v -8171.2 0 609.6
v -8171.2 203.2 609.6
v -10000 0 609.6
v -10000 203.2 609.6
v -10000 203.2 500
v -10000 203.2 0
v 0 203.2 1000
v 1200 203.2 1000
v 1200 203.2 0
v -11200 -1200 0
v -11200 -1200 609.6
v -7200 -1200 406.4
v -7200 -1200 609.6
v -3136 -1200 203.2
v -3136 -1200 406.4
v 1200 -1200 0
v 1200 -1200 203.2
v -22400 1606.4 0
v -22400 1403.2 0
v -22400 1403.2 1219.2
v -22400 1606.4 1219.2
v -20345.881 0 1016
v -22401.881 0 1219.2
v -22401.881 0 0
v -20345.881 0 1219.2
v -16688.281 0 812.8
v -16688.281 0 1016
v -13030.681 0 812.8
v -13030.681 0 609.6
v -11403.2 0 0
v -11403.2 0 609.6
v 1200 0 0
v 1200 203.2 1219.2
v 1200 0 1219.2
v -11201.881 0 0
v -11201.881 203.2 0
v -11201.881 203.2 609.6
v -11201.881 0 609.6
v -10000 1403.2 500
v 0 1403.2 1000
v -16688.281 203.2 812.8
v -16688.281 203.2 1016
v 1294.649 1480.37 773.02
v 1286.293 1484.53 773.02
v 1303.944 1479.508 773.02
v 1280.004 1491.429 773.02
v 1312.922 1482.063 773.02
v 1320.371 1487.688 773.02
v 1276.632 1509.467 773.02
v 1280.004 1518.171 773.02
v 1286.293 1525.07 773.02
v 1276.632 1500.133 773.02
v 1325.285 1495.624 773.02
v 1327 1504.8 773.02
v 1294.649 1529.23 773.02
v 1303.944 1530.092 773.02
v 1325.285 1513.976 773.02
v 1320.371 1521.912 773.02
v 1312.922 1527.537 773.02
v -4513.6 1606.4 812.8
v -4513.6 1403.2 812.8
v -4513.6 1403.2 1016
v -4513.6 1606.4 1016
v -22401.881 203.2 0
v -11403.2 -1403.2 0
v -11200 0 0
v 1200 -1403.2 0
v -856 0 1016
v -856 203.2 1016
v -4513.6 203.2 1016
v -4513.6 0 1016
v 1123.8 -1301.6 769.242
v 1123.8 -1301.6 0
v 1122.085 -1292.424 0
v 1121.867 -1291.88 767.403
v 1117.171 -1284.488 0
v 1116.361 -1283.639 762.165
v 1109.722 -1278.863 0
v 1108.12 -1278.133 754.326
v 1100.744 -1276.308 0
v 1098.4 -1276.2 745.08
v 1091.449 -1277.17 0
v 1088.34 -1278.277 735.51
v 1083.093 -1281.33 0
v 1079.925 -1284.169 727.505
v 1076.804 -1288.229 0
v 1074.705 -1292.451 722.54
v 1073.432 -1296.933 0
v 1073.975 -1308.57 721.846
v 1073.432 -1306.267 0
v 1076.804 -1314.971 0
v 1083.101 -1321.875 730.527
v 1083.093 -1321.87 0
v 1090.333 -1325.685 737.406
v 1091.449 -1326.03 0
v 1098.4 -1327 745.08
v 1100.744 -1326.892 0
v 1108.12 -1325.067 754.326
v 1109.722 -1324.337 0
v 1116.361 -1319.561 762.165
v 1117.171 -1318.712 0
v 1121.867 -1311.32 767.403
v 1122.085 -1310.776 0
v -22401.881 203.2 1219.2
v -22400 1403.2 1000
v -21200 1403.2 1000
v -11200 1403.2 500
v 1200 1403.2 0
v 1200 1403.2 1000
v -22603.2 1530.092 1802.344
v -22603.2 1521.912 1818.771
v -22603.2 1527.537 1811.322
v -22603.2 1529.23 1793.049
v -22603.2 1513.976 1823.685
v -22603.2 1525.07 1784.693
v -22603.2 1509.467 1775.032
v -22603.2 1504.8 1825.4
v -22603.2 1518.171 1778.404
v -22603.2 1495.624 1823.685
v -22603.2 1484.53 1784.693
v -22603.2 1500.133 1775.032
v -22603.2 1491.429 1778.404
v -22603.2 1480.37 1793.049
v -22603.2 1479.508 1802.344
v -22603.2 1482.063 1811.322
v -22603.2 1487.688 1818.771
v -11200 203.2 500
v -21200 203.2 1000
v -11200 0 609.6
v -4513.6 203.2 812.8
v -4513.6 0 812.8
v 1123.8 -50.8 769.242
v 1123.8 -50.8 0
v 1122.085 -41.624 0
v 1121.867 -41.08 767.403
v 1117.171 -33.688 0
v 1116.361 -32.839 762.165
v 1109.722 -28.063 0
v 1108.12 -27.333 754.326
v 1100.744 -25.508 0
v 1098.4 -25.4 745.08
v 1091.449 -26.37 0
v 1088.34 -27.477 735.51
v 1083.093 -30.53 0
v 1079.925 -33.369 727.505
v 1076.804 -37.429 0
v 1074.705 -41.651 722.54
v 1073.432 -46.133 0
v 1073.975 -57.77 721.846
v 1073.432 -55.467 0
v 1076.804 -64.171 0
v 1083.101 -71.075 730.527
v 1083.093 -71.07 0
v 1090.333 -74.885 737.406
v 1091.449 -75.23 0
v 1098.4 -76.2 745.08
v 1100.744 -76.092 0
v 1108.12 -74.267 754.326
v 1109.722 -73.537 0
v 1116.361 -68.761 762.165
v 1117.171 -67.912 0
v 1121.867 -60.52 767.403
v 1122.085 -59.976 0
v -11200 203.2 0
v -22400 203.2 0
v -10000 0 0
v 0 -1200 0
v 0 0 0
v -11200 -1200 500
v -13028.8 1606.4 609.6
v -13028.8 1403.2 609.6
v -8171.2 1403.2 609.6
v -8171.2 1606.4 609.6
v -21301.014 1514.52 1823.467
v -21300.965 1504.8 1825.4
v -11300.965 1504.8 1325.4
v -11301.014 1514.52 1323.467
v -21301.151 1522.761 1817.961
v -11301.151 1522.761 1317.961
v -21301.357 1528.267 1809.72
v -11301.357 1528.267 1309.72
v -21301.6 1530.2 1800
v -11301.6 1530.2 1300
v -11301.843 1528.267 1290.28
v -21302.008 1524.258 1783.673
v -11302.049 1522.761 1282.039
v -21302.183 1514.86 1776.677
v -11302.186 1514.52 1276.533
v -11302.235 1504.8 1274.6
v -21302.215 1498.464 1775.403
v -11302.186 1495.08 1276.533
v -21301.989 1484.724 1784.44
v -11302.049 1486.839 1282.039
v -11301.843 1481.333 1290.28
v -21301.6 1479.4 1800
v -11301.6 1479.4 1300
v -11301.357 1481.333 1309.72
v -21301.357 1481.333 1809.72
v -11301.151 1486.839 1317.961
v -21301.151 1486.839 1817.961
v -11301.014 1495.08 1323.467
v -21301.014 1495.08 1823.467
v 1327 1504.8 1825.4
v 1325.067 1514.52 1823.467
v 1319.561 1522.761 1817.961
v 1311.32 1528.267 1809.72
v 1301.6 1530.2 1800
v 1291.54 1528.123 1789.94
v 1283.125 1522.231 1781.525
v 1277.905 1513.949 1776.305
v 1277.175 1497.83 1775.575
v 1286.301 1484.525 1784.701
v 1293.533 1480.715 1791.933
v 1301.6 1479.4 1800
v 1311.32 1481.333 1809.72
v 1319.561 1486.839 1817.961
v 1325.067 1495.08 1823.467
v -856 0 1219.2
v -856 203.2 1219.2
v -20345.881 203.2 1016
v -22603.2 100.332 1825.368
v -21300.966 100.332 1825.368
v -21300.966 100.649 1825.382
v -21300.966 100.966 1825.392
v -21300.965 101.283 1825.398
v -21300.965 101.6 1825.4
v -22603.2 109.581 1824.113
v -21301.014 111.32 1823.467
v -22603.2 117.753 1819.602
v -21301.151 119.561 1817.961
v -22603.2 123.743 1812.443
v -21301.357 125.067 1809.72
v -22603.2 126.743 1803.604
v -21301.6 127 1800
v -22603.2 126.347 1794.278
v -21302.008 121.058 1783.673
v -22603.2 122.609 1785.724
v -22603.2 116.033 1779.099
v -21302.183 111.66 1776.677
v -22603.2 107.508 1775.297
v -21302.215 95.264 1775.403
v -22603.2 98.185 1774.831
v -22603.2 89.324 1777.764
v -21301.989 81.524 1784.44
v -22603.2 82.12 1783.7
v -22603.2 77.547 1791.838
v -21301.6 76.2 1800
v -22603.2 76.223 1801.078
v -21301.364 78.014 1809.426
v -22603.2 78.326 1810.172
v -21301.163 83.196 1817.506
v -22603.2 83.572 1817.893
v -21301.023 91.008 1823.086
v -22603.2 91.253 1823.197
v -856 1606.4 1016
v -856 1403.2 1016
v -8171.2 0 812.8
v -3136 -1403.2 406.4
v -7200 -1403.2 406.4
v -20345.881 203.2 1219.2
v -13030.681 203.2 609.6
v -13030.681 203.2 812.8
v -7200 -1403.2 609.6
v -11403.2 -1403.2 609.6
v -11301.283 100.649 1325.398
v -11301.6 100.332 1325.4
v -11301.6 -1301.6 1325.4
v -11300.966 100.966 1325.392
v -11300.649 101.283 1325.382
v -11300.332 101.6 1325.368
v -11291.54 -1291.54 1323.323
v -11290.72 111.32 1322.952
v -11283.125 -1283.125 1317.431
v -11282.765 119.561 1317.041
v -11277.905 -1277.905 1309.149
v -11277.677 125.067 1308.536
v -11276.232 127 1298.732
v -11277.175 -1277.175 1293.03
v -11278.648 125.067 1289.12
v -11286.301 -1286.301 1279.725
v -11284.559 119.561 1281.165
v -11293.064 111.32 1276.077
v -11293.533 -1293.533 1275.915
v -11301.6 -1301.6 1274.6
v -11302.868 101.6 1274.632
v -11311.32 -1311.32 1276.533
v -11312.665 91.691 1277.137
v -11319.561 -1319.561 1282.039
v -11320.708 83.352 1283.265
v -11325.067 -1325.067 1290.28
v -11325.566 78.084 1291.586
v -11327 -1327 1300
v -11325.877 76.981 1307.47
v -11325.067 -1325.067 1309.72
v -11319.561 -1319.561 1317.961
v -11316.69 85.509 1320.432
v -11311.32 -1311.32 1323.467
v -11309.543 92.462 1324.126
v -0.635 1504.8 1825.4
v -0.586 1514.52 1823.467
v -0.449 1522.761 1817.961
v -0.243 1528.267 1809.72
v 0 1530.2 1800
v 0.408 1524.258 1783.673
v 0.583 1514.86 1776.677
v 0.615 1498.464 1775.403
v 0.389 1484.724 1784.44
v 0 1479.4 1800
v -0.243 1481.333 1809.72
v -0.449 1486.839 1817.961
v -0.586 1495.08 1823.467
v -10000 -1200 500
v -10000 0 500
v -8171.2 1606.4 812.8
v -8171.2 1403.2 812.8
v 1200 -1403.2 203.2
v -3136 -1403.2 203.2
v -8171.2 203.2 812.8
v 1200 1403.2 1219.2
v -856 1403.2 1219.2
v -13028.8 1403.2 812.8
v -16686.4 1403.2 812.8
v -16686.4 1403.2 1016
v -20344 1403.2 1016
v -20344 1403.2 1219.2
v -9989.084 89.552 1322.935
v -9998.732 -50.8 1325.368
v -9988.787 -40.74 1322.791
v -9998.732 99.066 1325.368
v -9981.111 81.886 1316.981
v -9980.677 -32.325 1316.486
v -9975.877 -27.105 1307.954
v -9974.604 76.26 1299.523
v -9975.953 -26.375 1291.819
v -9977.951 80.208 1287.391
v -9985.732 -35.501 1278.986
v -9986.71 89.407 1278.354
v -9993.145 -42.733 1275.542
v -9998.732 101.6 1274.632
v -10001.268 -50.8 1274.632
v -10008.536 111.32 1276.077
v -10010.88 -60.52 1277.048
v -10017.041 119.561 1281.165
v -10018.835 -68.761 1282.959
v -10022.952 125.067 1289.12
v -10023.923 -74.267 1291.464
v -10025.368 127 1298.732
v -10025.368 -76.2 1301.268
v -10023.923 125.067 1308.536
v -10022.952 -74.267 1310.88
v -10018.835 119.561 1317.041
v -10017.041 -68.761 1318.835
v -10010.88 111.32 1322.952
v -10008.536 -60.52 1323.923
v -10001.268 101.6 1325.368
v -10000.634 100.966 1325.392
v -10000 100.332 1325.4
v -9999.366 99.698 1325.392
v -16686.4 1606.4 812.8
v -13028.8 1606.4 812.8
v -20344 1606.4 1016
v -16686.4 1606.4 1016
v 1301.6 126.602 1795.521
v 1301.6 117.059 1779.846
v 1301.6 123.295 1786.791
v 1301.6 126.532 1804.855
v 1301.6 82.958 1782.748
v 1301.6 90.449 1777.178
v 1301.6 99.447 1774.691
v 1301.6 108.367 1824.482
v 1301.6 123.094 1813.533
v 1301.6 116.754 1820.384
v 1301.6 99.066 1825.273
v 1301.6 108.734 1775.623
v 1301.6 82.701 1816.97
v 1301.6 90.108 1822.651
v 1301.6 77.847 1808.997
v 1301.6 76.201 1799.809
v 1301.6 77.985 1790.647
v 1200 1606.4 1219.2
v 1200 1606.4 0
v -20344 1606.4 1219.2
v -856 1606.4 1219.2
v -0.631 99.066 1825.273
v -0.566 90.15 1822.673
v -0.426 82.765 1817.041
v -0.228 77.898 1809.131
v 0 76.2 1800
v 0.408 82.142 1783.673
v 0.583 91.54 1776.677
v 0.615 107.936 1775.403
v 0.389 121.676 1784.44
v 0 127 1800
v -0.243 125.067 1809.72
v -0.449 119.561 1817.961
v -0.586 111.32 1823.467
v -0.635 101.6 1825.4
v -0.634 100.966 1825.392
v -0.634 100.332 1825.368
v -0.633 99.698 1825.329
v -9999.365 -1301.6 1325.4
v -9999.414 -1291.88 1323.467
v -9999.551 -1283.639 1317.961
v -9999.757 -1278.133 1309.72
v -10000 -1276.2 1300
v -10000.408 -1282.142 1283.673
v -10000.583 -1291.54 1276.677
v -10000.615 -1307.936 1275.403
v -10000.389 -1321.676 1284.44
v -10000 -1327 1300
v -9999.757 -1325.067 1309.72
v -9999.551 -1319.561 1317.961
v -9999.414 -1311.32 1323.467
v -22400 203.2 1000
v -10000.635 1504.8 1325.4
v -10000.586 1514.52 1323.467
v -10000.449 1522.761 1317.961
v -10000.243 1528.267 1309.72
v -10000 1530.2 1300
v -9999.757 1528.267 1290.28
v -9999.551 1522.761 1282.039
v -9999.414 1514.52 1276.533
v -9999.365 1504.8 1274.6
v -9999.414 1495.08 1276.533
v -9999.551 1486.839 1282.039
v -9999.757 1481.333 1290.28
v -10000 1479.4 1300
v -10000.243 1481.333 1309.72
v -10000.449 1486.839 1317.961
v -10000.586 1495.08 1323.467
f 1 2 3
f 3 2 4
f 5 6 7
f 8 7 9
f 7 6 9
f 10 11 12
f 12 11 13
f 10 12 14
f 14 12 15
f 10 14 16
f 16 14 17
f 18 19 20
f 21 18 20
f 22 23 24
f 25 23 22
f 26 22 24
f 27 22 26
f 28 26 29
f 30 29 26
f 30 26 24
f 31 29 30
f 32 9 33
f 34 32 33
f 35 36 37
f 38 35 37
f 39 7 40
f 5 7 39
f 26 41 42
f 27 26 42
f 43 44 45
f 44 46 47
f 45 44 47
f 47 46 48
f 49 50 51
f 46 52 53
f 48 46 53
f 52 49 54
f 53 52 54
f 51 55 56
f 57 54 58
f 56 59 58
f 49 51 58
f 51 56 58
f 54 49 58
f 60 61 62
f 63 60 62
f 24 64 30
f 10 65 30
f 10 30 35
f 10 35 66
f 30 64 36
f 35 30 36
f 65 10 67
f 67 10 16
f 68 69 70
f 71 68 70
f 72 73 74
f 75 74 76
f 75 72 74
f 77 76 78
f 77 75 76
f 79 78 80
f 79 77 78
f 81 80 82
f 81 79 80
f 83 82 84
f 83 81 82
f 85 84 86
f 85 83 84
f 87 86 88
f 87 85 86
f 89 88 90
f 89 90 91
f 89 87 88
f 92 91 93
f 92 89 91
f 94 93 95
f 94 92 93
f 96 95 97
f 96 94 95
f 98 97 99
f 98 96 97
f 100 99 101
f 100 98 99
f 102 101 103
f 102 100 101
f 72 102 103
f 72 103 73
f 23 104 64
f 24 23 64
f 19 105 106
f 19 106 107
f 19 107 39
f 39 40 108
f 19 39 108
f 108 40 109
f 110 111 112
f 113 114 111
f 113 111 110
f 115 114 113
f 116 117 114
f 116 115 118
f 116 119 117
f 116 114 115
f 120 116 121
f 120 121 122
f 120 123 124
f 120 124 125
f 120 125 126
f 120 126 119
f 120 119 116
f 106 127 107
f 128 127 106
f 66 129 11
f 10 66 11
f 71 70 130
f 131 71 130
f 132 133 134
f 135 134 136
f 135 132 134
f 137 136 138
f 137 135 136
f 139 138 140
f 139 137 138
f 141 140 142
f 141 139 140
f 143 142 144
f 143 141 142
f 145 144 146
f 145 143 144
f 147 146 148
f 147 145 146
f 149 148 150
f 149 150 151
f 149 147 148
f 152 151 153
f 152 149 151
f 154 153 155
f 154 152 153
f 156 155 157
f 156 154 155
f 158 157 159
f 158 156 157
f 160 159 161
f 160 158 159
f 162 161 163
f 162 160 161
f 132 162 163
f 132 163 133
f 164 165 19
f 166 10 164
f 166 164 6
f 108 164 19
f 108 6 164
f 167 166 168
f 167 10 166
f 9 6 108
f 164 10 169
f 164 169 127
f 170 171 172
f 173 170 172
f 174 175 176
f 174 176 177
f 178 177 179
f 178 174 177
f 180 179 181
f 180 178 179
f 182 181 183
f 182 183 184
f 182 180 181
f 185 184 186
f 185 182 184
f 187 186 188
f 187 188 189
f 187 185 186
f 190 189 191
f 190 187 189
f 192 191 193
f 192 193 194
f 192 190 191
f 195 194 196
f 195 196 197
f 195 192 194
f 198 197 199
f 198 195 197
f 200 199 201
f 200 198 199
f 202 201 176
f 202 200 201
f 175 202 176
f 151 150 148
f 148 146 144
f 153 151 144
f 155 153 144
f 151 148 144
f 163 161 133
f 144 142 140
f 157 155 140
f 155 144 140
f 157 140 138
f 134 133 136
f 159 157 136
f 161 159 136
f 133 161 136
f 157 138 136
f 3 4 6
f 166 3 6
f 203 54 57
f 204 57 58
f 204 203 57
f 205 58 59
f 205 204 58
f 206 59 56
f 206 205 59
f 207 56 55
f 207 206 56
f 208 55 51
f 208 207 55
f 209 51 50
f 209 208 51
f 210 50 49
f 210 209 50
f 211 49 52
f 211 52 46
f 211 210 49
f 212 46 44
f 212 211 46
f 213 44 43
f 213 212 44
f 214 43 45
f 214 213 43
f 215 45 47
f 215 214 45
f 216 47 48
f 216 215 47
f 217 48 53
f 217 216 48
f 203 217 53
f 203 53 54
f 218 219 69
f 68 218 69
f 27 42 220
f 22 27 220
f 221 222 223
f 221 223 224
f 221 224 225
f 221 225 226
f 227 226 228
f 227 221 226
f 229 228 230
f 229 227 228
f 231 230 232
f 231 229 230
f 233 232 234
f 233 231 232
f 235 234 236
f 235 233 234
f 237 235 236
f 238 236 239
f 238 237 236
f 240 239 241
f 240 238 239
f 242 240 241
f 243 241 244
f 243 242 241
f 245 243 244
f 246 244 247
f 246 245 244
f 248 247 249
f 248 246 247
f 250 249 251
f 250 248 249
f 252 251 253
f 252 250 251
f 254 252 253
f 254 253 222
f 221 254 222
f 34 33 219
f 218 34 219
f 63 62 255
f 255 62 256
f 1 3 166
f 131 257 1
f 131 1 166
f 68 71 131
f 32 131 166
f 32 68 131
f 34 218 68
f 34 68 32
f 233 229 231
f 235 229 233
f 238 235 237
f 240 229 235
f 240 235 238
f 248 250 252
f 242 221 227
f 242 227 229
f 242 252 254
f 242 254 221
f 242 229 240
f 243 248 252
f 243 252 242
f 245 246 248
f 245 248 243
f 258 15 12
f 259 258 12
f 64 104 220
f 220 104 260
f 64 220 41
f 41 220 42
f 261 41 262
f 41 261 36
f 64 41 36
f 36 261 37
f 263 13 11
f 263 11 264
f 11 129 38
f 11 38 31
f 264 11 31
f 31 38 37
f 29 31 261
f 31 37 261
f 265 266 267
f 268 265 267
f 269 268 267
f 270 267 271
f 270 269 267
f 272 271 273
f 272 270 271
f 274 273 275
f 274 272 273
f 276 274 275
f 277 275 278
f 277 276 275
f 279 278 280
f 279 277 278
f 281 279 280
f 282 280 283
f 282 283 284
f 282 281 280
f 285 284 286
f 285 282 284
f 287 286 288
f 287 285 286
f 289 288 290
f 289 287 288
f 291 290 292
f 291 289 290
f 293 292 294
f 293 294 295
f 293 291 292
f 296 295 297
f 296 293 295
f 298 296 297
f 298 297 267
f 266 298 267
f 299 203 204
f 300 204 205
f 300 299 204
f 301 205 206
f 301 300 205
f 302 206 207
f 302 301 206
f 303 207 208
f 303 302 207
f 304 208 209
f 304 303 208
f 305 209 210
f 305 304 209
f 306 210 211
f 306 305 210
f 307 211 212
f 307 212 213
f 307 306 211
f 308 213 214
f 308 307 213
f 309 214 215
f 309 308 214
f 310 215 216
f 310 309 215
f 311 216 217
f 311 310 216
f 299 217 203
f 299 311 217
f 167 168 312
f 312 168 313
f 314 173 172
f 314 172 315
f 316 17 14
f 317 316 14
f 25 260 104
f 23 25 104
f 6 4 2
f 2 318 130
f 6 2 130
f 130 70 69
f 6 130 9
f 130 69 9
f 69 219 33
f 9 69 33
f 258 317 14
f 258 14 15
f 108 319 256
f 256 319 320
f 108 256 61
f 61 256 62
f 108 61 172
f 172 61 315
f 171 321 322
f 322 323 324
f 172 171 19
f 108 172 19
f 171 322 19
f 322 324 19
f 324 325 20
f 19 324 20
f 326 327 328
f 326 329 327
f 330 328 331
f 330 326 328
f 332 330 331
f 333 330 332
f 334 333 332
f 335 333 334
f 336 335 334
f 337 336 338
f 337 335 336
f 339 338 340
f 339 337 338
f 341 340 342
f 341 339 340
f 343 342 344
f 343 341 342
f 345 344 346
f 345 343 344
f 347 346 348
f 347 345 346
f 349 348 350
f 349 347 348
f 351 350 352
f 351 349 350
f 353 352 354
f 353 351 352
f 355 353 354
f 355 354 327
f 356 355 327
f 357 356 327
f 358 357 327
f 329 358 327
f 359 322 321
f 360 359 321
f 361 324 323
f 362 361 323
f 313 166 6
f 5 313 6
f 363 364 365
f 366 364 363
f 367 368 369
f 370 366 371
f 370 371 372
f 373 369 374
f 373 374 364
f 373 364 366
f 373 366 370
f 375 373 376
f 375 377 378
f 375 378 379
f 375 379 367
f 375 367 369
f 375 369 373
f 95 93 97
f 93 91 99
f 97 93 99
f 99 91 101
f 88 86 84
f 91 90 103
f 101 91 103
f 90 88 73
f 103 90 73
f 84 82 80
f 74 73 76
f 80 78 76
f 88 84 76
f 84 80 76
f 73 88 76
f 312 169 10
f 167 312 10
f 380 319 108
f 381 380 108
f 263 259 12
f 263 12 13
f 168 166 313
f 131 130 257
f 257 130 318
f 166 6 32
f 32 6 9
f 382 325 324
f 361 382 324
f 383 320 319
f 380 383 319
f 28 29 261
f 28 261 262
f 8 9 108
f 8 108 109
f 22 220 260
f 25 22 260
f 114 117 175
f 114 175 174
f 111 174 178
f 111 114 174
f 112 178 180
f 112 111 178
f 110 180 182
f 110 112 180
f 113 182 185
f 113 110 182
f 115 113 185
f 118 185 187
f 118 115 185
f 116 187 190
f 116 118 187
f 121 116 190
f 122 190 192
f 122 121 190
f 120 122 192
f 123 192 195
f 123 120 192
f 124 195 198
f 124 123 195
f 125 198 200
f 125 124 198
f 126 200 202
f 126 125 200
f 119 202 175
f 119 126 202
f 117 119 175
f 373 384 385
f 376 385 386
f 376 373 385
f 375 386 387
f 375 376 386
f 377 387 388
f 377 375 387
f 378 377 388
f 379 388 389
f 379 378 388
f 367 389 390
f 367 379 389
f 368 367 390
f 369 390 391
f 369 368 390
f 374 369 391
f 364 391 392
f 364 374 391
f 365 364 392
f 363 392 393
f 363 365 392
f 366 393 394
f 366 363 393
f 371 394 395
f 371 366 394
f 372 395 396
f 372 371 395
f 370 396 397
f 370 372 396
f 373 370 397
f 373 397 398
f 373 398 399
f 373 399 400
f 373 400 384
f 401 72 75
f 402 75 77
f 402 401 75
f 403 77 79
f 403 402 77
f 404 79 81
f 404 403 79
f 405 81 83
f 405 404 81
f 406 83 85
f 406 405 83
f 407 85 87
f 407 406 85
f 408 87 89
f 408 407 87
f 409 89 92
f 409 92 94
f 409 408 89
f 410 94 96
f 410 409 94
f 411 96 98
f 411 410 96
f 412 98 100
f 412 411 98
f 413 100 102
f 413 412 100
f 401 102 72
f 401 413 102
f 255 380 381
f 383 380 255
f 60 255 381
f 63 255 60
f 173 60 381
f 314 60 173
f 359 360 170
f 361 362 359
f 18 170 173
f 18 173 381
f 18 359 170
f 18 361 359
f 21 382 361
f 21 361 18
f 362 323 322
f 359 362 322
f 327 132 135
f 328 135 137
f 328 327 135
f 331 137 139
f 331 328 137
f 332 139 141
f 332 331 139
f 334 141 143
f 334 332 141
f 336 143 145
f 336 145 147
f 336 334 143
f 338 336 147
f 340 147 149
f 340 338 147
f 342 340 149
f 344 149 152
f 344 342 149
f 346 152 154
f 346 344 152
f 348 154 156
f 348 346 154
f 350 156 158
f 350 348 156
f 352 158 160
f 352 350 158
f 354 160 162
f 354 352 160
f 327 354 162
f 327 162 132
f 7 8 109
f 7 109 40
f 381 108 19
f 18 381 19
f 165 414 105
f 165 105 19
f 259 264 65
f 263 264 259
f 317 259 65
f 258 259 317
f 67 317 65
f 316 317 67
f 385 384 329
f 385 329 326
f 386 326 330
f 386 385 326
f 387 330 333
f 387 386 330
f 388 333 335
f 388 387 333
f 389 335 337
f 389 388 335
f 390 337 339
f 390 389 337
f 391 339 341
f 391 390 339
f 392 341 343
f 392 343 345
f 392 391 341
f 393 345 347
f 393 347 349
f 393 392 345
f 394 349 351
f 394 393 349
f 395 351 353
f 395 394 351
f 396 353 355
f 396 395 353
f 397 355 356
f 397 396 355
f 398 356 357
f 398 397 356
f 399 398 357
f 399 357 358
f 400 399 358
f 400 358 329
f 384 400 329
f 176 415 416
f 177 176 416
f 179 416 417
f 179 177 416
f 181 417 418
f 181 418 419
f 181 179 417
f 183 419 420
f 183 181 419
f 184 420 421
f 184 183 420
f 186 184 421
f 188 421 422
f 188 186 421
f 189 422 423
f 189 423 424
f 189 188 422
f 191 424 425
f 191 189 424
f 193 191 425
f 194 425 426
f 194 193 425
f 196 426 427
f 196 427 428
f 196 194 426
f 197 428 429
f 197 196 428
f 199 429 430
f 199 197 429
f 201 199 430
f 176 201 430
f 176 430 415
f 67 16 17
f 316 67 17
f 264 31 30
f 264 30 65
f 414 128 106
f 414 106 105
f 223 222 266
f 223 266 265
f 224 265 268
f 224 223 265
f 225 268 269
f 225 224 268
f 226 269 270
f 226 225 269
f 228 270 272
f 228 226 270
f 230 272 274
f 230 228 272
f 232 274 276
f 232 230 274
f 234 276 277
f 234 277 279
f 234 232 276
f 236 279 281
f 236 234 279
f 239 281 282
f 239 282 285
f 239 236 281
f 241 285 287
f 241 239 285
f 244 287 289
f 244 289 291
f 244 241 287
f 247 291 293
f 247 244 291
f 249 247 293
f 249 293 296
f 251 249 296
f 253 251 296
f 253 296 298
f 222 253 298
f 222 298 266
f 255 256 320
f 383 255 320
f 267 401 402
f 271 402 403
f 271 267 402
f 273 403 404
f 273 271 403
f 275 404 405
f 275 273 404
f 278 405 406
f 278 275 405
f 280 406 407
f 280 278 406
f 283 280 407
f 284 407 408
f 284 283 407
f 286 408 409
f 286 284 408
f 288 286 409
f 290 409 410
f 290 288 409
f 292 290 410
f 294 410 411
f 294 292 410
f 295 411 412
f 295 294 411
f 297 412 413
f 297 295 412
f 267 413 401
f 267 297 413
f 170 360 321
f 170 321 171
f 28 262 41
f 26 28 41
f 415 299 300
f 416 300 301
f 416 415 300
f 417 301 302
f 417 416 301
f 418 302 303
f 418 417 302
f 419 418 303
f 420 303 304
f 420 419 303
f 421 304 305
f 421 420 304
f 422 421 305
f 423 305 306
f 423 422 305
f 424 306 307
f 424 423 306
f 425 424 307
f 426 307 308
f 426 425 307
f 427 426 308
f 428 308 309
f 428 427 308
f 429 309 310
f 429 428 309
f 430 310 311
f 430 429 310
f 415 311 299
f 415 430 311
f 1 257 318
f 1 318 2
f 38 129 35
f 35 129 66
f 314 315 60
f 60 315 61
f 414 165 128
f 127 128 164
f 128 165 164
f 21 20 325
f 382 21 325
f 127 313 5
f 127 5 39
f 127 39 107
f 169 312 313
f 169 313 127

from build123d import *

# Parameters (mm, degrees)
F1_DEPTH  = 1200
F2_DEPTH  = 1403.2
F3_W      = 11200
F3_H      = 203.2
F4_DEPTH  = 1000.001
F7_DEPTH  = 203.2
F9_DEPTH  = 203.2
F11_DEPTH = 203.2
F13_DEPTH = 203.2
F24_R     = 25.4
F26_R     = 25.4
F29_R     = 25.4


# Not quite as in the source:
# - the program builds the solid bodies; features that only make, move or delete a surface that nothing else refers to are left out


with BuildPart() as f1:
    # F0 (on Front) → F1 (new body)
    with BuildSketch(Plane.XZ):
        Polygon((-10000, 0), (0, 0), (-10000, 500), (-11200, 500), (-11200, 0), align=None)
    extrude(amount=F1_DEPTH)

    # F0 (on Front) → F2 (join)
    with BuildSketch(Plane.XZ):
        Polygon((-10000, 500), (0, 0), (1200, 0), (1200, 1000), (0, 1000), align=None)
        Polygon((-10000, 0), (0, 0), (-10000, 500), (-11200, 500), (-11200, 0), align=None)
        Polygon((-21200, 0), (-11200, 0), (-11200, 500), (-21200, 1000), (-22400, 1000), (-22400, 0), align=None)
    extrude(amount=-F2_DEPTH)

    # F3 (on Top) → F4 (cut, through all)
    with BuildSketch(Plane.XY):
        with Locations((-4400, 101.6)):
            Rectangle(F3_W, F3_H)
        with Locations((-16800, 101.6)):
            Rectangle(F3_W, F3_H)
    extrude(amount=F4_DEPTH, mode=Mode.SUBTRACT)


with BuildPart() as f7:
    # F6 (on face) → F7 (new body)
    with BuildSketch(Plane.XZ.offset(-203.2)):
        Polygon((-10000, 609.6), (-10000, 0), (1200, 0), (1200, 1219.2), (-856, 1219.2), (-856, 1016), (-4513.6, 1016), (-4513.6, 812.8), (-8171.2, 812.8), (-8171.2, 609.6), align=None)
    extrude(amount=F7_DEPTH)


with BuildPart() as f7b:
    # F6 (on face) → F7, piece 2 (new body)
    with BuildSketch(Plane.XZ.offset(-203.2)):
        Polygon((-16688.2814086914, 1016), (-20345.8814086914, 1016), (-20345.8814086914, 1219.2), (-22401.8814086914, 1219.2), (-22401.8814086914, 0), (-11201.8814086914, 0), (-11201.8814086914, 609.6), (-13030.6814086914, 609.6), (-13030.6814086914, 812.8), (-16688.2814086914, 812.8), align=None)
    extrude(amount=F7_DEPTH)

    # F10 (on face) → F11 (join)
    with BuildSketch(Plane(origin=(-11200, 0, 0), x_dir=(0, -1, 0), z_dir=(-1, 0, 0))):
        Polygon((0, 609.6), (0, 0), (1200, 0), (1403.2, 0), (1403.2, 609.6), (1200, 609.6), align=None)
    extrude(amount=F11_DEPTH)

    # F12 (on face) → F13 (join)
    with BuildSketch(Plane.XZ.offset(1200)):
        Polygon((-11200, 609.6), (-11200, 500), (-11200, 0), (1200, 0), (1200, 203.2), (928, 203.2), (-3136, 203.2), (-3136, 406.4), (-7200, 406.4), (-7200, 609.6), align=None)
    extrude(amount=F13_DEPTH)


with BuildPart() as f9:
    # F8 (on face) → F9 (new body)
    with BuildSketch(Plane(origin=(0, 1403.2, 0), x_dir=(-1, 0, 0), z_dir=(0, 1, 0))):
        Polygon((11200, 609.6), (10000, 609.6), (8171.2, 609.6), (8171.2, 812.8), (4513.6, 812.8), (4513.6, 1016), (856, 1016), (856, 1219.2), (-1200, 1219.2), (-1200, 0), (10000, 0), (11200, 0), (22400, 0), (22400, 1219.2), (20344, 1219.2), (20344, 1016), (16686.4, 1016), (16686.4, 812.8), (13028.8, 812.8), (13028.8, 609.6), align=None)
    extrude(amount=F9_DEPTH)


with BuildPart() as f25:
    # F25: sweep along a path in F15, F18, F21
    with BuildLine(Plane.XZ.offset(1301.6)) as f25_path:
        Line((1098.4, 0), (1098.4, 745.08))
        Line((1098.4, 745.08), (-10000, 1300))
    with BuildLine(Plane.XY.offset(1300)) as f25_path_2:
        Line((-10000, -1301.6), (-11301.6, -1301.6))
        Line((-11301.6, -1301.6), (-11301.6, 101.6))
    with BuildLine(Plane.XZ.offset(-101.6)) as f25_path_3:
        Line((-11301.6, 1300), (-21301.6, 1800))
        Line((-21301.6, 1800), (-22603.2, 1800))
    # F24 (on Top) → F25 (sweep)
    with BuildSketch(Plane.XY):
        with Locations((1098.4, -1301.6)):
            Circle(F24_R)
    sweep(path=f25_path.line + f25_path_2.line + f25_path_3.line, transition=Transition.RIGHT)


with BuildPart() as f27:
    # F27: sweep along a path in F23, F18, F21
    with BuildLine(Plane.XZ.offset(50.8)) as f27_path:
        Line((1098.4, 0), (1098.4, 745.08))
        Line((1098.4, 745.08), (-10000, 1300))
    with BuildLine(Plane.XY.offset(1300)) as f27_path_2:
        Line((-10000, 101.6), (-10000, -50.8))
    with BuildLine(Plane.XZ.offset(-101.6)) as f27_path_3:
        Line((-10000, 1300), (0, 1800))
        Line((0, 1800), (1301.6, 1800))
    # F26 (on Top) → F27 (sweep)
    with BuildSketch(Plane.XY):
        with Locations((1098.4, -50.8)):
            Circle(F26_R)
    sweep(path=f27_path.line + f27_path_2.line + f27_path_3.line, transition=Transition.RIGHT)


with BuildPart() as f30:
    # F30: sweep along a path in F30_path
    with BuildLine(Plane(origin=(1301.6, 1504.8, 1800), x_dir=(0, 0, 1), z_dir=(0, -1, 0))) as f30_path:
        Line((-1026.9801497459, 0), (0, 0))
        Line((0, 0), (0, 1301.6))
        Line((0, 1301.6), (-500, 11301.6))
        Line((-500, 11301.6), (-500, 12603.2))
        Line((-500, 12603.2), (0, 22603.2))
        Line((0, 22603.2), (0, 23904.8))
    # F29 (on plane+point) → F30 (sweep)
    with BuildSketch(Plane.XY.offset(773.0198502541)):
        with Locations((1301.6, 1504.8)):
            Circle(F29_R)
    sweep(path=f30_path.line, transition=Transition.RIGHT)


solid = Compound([f1.part, f7.part, f7b.part, f9.part, f25.part, f27.part, f30.part])
